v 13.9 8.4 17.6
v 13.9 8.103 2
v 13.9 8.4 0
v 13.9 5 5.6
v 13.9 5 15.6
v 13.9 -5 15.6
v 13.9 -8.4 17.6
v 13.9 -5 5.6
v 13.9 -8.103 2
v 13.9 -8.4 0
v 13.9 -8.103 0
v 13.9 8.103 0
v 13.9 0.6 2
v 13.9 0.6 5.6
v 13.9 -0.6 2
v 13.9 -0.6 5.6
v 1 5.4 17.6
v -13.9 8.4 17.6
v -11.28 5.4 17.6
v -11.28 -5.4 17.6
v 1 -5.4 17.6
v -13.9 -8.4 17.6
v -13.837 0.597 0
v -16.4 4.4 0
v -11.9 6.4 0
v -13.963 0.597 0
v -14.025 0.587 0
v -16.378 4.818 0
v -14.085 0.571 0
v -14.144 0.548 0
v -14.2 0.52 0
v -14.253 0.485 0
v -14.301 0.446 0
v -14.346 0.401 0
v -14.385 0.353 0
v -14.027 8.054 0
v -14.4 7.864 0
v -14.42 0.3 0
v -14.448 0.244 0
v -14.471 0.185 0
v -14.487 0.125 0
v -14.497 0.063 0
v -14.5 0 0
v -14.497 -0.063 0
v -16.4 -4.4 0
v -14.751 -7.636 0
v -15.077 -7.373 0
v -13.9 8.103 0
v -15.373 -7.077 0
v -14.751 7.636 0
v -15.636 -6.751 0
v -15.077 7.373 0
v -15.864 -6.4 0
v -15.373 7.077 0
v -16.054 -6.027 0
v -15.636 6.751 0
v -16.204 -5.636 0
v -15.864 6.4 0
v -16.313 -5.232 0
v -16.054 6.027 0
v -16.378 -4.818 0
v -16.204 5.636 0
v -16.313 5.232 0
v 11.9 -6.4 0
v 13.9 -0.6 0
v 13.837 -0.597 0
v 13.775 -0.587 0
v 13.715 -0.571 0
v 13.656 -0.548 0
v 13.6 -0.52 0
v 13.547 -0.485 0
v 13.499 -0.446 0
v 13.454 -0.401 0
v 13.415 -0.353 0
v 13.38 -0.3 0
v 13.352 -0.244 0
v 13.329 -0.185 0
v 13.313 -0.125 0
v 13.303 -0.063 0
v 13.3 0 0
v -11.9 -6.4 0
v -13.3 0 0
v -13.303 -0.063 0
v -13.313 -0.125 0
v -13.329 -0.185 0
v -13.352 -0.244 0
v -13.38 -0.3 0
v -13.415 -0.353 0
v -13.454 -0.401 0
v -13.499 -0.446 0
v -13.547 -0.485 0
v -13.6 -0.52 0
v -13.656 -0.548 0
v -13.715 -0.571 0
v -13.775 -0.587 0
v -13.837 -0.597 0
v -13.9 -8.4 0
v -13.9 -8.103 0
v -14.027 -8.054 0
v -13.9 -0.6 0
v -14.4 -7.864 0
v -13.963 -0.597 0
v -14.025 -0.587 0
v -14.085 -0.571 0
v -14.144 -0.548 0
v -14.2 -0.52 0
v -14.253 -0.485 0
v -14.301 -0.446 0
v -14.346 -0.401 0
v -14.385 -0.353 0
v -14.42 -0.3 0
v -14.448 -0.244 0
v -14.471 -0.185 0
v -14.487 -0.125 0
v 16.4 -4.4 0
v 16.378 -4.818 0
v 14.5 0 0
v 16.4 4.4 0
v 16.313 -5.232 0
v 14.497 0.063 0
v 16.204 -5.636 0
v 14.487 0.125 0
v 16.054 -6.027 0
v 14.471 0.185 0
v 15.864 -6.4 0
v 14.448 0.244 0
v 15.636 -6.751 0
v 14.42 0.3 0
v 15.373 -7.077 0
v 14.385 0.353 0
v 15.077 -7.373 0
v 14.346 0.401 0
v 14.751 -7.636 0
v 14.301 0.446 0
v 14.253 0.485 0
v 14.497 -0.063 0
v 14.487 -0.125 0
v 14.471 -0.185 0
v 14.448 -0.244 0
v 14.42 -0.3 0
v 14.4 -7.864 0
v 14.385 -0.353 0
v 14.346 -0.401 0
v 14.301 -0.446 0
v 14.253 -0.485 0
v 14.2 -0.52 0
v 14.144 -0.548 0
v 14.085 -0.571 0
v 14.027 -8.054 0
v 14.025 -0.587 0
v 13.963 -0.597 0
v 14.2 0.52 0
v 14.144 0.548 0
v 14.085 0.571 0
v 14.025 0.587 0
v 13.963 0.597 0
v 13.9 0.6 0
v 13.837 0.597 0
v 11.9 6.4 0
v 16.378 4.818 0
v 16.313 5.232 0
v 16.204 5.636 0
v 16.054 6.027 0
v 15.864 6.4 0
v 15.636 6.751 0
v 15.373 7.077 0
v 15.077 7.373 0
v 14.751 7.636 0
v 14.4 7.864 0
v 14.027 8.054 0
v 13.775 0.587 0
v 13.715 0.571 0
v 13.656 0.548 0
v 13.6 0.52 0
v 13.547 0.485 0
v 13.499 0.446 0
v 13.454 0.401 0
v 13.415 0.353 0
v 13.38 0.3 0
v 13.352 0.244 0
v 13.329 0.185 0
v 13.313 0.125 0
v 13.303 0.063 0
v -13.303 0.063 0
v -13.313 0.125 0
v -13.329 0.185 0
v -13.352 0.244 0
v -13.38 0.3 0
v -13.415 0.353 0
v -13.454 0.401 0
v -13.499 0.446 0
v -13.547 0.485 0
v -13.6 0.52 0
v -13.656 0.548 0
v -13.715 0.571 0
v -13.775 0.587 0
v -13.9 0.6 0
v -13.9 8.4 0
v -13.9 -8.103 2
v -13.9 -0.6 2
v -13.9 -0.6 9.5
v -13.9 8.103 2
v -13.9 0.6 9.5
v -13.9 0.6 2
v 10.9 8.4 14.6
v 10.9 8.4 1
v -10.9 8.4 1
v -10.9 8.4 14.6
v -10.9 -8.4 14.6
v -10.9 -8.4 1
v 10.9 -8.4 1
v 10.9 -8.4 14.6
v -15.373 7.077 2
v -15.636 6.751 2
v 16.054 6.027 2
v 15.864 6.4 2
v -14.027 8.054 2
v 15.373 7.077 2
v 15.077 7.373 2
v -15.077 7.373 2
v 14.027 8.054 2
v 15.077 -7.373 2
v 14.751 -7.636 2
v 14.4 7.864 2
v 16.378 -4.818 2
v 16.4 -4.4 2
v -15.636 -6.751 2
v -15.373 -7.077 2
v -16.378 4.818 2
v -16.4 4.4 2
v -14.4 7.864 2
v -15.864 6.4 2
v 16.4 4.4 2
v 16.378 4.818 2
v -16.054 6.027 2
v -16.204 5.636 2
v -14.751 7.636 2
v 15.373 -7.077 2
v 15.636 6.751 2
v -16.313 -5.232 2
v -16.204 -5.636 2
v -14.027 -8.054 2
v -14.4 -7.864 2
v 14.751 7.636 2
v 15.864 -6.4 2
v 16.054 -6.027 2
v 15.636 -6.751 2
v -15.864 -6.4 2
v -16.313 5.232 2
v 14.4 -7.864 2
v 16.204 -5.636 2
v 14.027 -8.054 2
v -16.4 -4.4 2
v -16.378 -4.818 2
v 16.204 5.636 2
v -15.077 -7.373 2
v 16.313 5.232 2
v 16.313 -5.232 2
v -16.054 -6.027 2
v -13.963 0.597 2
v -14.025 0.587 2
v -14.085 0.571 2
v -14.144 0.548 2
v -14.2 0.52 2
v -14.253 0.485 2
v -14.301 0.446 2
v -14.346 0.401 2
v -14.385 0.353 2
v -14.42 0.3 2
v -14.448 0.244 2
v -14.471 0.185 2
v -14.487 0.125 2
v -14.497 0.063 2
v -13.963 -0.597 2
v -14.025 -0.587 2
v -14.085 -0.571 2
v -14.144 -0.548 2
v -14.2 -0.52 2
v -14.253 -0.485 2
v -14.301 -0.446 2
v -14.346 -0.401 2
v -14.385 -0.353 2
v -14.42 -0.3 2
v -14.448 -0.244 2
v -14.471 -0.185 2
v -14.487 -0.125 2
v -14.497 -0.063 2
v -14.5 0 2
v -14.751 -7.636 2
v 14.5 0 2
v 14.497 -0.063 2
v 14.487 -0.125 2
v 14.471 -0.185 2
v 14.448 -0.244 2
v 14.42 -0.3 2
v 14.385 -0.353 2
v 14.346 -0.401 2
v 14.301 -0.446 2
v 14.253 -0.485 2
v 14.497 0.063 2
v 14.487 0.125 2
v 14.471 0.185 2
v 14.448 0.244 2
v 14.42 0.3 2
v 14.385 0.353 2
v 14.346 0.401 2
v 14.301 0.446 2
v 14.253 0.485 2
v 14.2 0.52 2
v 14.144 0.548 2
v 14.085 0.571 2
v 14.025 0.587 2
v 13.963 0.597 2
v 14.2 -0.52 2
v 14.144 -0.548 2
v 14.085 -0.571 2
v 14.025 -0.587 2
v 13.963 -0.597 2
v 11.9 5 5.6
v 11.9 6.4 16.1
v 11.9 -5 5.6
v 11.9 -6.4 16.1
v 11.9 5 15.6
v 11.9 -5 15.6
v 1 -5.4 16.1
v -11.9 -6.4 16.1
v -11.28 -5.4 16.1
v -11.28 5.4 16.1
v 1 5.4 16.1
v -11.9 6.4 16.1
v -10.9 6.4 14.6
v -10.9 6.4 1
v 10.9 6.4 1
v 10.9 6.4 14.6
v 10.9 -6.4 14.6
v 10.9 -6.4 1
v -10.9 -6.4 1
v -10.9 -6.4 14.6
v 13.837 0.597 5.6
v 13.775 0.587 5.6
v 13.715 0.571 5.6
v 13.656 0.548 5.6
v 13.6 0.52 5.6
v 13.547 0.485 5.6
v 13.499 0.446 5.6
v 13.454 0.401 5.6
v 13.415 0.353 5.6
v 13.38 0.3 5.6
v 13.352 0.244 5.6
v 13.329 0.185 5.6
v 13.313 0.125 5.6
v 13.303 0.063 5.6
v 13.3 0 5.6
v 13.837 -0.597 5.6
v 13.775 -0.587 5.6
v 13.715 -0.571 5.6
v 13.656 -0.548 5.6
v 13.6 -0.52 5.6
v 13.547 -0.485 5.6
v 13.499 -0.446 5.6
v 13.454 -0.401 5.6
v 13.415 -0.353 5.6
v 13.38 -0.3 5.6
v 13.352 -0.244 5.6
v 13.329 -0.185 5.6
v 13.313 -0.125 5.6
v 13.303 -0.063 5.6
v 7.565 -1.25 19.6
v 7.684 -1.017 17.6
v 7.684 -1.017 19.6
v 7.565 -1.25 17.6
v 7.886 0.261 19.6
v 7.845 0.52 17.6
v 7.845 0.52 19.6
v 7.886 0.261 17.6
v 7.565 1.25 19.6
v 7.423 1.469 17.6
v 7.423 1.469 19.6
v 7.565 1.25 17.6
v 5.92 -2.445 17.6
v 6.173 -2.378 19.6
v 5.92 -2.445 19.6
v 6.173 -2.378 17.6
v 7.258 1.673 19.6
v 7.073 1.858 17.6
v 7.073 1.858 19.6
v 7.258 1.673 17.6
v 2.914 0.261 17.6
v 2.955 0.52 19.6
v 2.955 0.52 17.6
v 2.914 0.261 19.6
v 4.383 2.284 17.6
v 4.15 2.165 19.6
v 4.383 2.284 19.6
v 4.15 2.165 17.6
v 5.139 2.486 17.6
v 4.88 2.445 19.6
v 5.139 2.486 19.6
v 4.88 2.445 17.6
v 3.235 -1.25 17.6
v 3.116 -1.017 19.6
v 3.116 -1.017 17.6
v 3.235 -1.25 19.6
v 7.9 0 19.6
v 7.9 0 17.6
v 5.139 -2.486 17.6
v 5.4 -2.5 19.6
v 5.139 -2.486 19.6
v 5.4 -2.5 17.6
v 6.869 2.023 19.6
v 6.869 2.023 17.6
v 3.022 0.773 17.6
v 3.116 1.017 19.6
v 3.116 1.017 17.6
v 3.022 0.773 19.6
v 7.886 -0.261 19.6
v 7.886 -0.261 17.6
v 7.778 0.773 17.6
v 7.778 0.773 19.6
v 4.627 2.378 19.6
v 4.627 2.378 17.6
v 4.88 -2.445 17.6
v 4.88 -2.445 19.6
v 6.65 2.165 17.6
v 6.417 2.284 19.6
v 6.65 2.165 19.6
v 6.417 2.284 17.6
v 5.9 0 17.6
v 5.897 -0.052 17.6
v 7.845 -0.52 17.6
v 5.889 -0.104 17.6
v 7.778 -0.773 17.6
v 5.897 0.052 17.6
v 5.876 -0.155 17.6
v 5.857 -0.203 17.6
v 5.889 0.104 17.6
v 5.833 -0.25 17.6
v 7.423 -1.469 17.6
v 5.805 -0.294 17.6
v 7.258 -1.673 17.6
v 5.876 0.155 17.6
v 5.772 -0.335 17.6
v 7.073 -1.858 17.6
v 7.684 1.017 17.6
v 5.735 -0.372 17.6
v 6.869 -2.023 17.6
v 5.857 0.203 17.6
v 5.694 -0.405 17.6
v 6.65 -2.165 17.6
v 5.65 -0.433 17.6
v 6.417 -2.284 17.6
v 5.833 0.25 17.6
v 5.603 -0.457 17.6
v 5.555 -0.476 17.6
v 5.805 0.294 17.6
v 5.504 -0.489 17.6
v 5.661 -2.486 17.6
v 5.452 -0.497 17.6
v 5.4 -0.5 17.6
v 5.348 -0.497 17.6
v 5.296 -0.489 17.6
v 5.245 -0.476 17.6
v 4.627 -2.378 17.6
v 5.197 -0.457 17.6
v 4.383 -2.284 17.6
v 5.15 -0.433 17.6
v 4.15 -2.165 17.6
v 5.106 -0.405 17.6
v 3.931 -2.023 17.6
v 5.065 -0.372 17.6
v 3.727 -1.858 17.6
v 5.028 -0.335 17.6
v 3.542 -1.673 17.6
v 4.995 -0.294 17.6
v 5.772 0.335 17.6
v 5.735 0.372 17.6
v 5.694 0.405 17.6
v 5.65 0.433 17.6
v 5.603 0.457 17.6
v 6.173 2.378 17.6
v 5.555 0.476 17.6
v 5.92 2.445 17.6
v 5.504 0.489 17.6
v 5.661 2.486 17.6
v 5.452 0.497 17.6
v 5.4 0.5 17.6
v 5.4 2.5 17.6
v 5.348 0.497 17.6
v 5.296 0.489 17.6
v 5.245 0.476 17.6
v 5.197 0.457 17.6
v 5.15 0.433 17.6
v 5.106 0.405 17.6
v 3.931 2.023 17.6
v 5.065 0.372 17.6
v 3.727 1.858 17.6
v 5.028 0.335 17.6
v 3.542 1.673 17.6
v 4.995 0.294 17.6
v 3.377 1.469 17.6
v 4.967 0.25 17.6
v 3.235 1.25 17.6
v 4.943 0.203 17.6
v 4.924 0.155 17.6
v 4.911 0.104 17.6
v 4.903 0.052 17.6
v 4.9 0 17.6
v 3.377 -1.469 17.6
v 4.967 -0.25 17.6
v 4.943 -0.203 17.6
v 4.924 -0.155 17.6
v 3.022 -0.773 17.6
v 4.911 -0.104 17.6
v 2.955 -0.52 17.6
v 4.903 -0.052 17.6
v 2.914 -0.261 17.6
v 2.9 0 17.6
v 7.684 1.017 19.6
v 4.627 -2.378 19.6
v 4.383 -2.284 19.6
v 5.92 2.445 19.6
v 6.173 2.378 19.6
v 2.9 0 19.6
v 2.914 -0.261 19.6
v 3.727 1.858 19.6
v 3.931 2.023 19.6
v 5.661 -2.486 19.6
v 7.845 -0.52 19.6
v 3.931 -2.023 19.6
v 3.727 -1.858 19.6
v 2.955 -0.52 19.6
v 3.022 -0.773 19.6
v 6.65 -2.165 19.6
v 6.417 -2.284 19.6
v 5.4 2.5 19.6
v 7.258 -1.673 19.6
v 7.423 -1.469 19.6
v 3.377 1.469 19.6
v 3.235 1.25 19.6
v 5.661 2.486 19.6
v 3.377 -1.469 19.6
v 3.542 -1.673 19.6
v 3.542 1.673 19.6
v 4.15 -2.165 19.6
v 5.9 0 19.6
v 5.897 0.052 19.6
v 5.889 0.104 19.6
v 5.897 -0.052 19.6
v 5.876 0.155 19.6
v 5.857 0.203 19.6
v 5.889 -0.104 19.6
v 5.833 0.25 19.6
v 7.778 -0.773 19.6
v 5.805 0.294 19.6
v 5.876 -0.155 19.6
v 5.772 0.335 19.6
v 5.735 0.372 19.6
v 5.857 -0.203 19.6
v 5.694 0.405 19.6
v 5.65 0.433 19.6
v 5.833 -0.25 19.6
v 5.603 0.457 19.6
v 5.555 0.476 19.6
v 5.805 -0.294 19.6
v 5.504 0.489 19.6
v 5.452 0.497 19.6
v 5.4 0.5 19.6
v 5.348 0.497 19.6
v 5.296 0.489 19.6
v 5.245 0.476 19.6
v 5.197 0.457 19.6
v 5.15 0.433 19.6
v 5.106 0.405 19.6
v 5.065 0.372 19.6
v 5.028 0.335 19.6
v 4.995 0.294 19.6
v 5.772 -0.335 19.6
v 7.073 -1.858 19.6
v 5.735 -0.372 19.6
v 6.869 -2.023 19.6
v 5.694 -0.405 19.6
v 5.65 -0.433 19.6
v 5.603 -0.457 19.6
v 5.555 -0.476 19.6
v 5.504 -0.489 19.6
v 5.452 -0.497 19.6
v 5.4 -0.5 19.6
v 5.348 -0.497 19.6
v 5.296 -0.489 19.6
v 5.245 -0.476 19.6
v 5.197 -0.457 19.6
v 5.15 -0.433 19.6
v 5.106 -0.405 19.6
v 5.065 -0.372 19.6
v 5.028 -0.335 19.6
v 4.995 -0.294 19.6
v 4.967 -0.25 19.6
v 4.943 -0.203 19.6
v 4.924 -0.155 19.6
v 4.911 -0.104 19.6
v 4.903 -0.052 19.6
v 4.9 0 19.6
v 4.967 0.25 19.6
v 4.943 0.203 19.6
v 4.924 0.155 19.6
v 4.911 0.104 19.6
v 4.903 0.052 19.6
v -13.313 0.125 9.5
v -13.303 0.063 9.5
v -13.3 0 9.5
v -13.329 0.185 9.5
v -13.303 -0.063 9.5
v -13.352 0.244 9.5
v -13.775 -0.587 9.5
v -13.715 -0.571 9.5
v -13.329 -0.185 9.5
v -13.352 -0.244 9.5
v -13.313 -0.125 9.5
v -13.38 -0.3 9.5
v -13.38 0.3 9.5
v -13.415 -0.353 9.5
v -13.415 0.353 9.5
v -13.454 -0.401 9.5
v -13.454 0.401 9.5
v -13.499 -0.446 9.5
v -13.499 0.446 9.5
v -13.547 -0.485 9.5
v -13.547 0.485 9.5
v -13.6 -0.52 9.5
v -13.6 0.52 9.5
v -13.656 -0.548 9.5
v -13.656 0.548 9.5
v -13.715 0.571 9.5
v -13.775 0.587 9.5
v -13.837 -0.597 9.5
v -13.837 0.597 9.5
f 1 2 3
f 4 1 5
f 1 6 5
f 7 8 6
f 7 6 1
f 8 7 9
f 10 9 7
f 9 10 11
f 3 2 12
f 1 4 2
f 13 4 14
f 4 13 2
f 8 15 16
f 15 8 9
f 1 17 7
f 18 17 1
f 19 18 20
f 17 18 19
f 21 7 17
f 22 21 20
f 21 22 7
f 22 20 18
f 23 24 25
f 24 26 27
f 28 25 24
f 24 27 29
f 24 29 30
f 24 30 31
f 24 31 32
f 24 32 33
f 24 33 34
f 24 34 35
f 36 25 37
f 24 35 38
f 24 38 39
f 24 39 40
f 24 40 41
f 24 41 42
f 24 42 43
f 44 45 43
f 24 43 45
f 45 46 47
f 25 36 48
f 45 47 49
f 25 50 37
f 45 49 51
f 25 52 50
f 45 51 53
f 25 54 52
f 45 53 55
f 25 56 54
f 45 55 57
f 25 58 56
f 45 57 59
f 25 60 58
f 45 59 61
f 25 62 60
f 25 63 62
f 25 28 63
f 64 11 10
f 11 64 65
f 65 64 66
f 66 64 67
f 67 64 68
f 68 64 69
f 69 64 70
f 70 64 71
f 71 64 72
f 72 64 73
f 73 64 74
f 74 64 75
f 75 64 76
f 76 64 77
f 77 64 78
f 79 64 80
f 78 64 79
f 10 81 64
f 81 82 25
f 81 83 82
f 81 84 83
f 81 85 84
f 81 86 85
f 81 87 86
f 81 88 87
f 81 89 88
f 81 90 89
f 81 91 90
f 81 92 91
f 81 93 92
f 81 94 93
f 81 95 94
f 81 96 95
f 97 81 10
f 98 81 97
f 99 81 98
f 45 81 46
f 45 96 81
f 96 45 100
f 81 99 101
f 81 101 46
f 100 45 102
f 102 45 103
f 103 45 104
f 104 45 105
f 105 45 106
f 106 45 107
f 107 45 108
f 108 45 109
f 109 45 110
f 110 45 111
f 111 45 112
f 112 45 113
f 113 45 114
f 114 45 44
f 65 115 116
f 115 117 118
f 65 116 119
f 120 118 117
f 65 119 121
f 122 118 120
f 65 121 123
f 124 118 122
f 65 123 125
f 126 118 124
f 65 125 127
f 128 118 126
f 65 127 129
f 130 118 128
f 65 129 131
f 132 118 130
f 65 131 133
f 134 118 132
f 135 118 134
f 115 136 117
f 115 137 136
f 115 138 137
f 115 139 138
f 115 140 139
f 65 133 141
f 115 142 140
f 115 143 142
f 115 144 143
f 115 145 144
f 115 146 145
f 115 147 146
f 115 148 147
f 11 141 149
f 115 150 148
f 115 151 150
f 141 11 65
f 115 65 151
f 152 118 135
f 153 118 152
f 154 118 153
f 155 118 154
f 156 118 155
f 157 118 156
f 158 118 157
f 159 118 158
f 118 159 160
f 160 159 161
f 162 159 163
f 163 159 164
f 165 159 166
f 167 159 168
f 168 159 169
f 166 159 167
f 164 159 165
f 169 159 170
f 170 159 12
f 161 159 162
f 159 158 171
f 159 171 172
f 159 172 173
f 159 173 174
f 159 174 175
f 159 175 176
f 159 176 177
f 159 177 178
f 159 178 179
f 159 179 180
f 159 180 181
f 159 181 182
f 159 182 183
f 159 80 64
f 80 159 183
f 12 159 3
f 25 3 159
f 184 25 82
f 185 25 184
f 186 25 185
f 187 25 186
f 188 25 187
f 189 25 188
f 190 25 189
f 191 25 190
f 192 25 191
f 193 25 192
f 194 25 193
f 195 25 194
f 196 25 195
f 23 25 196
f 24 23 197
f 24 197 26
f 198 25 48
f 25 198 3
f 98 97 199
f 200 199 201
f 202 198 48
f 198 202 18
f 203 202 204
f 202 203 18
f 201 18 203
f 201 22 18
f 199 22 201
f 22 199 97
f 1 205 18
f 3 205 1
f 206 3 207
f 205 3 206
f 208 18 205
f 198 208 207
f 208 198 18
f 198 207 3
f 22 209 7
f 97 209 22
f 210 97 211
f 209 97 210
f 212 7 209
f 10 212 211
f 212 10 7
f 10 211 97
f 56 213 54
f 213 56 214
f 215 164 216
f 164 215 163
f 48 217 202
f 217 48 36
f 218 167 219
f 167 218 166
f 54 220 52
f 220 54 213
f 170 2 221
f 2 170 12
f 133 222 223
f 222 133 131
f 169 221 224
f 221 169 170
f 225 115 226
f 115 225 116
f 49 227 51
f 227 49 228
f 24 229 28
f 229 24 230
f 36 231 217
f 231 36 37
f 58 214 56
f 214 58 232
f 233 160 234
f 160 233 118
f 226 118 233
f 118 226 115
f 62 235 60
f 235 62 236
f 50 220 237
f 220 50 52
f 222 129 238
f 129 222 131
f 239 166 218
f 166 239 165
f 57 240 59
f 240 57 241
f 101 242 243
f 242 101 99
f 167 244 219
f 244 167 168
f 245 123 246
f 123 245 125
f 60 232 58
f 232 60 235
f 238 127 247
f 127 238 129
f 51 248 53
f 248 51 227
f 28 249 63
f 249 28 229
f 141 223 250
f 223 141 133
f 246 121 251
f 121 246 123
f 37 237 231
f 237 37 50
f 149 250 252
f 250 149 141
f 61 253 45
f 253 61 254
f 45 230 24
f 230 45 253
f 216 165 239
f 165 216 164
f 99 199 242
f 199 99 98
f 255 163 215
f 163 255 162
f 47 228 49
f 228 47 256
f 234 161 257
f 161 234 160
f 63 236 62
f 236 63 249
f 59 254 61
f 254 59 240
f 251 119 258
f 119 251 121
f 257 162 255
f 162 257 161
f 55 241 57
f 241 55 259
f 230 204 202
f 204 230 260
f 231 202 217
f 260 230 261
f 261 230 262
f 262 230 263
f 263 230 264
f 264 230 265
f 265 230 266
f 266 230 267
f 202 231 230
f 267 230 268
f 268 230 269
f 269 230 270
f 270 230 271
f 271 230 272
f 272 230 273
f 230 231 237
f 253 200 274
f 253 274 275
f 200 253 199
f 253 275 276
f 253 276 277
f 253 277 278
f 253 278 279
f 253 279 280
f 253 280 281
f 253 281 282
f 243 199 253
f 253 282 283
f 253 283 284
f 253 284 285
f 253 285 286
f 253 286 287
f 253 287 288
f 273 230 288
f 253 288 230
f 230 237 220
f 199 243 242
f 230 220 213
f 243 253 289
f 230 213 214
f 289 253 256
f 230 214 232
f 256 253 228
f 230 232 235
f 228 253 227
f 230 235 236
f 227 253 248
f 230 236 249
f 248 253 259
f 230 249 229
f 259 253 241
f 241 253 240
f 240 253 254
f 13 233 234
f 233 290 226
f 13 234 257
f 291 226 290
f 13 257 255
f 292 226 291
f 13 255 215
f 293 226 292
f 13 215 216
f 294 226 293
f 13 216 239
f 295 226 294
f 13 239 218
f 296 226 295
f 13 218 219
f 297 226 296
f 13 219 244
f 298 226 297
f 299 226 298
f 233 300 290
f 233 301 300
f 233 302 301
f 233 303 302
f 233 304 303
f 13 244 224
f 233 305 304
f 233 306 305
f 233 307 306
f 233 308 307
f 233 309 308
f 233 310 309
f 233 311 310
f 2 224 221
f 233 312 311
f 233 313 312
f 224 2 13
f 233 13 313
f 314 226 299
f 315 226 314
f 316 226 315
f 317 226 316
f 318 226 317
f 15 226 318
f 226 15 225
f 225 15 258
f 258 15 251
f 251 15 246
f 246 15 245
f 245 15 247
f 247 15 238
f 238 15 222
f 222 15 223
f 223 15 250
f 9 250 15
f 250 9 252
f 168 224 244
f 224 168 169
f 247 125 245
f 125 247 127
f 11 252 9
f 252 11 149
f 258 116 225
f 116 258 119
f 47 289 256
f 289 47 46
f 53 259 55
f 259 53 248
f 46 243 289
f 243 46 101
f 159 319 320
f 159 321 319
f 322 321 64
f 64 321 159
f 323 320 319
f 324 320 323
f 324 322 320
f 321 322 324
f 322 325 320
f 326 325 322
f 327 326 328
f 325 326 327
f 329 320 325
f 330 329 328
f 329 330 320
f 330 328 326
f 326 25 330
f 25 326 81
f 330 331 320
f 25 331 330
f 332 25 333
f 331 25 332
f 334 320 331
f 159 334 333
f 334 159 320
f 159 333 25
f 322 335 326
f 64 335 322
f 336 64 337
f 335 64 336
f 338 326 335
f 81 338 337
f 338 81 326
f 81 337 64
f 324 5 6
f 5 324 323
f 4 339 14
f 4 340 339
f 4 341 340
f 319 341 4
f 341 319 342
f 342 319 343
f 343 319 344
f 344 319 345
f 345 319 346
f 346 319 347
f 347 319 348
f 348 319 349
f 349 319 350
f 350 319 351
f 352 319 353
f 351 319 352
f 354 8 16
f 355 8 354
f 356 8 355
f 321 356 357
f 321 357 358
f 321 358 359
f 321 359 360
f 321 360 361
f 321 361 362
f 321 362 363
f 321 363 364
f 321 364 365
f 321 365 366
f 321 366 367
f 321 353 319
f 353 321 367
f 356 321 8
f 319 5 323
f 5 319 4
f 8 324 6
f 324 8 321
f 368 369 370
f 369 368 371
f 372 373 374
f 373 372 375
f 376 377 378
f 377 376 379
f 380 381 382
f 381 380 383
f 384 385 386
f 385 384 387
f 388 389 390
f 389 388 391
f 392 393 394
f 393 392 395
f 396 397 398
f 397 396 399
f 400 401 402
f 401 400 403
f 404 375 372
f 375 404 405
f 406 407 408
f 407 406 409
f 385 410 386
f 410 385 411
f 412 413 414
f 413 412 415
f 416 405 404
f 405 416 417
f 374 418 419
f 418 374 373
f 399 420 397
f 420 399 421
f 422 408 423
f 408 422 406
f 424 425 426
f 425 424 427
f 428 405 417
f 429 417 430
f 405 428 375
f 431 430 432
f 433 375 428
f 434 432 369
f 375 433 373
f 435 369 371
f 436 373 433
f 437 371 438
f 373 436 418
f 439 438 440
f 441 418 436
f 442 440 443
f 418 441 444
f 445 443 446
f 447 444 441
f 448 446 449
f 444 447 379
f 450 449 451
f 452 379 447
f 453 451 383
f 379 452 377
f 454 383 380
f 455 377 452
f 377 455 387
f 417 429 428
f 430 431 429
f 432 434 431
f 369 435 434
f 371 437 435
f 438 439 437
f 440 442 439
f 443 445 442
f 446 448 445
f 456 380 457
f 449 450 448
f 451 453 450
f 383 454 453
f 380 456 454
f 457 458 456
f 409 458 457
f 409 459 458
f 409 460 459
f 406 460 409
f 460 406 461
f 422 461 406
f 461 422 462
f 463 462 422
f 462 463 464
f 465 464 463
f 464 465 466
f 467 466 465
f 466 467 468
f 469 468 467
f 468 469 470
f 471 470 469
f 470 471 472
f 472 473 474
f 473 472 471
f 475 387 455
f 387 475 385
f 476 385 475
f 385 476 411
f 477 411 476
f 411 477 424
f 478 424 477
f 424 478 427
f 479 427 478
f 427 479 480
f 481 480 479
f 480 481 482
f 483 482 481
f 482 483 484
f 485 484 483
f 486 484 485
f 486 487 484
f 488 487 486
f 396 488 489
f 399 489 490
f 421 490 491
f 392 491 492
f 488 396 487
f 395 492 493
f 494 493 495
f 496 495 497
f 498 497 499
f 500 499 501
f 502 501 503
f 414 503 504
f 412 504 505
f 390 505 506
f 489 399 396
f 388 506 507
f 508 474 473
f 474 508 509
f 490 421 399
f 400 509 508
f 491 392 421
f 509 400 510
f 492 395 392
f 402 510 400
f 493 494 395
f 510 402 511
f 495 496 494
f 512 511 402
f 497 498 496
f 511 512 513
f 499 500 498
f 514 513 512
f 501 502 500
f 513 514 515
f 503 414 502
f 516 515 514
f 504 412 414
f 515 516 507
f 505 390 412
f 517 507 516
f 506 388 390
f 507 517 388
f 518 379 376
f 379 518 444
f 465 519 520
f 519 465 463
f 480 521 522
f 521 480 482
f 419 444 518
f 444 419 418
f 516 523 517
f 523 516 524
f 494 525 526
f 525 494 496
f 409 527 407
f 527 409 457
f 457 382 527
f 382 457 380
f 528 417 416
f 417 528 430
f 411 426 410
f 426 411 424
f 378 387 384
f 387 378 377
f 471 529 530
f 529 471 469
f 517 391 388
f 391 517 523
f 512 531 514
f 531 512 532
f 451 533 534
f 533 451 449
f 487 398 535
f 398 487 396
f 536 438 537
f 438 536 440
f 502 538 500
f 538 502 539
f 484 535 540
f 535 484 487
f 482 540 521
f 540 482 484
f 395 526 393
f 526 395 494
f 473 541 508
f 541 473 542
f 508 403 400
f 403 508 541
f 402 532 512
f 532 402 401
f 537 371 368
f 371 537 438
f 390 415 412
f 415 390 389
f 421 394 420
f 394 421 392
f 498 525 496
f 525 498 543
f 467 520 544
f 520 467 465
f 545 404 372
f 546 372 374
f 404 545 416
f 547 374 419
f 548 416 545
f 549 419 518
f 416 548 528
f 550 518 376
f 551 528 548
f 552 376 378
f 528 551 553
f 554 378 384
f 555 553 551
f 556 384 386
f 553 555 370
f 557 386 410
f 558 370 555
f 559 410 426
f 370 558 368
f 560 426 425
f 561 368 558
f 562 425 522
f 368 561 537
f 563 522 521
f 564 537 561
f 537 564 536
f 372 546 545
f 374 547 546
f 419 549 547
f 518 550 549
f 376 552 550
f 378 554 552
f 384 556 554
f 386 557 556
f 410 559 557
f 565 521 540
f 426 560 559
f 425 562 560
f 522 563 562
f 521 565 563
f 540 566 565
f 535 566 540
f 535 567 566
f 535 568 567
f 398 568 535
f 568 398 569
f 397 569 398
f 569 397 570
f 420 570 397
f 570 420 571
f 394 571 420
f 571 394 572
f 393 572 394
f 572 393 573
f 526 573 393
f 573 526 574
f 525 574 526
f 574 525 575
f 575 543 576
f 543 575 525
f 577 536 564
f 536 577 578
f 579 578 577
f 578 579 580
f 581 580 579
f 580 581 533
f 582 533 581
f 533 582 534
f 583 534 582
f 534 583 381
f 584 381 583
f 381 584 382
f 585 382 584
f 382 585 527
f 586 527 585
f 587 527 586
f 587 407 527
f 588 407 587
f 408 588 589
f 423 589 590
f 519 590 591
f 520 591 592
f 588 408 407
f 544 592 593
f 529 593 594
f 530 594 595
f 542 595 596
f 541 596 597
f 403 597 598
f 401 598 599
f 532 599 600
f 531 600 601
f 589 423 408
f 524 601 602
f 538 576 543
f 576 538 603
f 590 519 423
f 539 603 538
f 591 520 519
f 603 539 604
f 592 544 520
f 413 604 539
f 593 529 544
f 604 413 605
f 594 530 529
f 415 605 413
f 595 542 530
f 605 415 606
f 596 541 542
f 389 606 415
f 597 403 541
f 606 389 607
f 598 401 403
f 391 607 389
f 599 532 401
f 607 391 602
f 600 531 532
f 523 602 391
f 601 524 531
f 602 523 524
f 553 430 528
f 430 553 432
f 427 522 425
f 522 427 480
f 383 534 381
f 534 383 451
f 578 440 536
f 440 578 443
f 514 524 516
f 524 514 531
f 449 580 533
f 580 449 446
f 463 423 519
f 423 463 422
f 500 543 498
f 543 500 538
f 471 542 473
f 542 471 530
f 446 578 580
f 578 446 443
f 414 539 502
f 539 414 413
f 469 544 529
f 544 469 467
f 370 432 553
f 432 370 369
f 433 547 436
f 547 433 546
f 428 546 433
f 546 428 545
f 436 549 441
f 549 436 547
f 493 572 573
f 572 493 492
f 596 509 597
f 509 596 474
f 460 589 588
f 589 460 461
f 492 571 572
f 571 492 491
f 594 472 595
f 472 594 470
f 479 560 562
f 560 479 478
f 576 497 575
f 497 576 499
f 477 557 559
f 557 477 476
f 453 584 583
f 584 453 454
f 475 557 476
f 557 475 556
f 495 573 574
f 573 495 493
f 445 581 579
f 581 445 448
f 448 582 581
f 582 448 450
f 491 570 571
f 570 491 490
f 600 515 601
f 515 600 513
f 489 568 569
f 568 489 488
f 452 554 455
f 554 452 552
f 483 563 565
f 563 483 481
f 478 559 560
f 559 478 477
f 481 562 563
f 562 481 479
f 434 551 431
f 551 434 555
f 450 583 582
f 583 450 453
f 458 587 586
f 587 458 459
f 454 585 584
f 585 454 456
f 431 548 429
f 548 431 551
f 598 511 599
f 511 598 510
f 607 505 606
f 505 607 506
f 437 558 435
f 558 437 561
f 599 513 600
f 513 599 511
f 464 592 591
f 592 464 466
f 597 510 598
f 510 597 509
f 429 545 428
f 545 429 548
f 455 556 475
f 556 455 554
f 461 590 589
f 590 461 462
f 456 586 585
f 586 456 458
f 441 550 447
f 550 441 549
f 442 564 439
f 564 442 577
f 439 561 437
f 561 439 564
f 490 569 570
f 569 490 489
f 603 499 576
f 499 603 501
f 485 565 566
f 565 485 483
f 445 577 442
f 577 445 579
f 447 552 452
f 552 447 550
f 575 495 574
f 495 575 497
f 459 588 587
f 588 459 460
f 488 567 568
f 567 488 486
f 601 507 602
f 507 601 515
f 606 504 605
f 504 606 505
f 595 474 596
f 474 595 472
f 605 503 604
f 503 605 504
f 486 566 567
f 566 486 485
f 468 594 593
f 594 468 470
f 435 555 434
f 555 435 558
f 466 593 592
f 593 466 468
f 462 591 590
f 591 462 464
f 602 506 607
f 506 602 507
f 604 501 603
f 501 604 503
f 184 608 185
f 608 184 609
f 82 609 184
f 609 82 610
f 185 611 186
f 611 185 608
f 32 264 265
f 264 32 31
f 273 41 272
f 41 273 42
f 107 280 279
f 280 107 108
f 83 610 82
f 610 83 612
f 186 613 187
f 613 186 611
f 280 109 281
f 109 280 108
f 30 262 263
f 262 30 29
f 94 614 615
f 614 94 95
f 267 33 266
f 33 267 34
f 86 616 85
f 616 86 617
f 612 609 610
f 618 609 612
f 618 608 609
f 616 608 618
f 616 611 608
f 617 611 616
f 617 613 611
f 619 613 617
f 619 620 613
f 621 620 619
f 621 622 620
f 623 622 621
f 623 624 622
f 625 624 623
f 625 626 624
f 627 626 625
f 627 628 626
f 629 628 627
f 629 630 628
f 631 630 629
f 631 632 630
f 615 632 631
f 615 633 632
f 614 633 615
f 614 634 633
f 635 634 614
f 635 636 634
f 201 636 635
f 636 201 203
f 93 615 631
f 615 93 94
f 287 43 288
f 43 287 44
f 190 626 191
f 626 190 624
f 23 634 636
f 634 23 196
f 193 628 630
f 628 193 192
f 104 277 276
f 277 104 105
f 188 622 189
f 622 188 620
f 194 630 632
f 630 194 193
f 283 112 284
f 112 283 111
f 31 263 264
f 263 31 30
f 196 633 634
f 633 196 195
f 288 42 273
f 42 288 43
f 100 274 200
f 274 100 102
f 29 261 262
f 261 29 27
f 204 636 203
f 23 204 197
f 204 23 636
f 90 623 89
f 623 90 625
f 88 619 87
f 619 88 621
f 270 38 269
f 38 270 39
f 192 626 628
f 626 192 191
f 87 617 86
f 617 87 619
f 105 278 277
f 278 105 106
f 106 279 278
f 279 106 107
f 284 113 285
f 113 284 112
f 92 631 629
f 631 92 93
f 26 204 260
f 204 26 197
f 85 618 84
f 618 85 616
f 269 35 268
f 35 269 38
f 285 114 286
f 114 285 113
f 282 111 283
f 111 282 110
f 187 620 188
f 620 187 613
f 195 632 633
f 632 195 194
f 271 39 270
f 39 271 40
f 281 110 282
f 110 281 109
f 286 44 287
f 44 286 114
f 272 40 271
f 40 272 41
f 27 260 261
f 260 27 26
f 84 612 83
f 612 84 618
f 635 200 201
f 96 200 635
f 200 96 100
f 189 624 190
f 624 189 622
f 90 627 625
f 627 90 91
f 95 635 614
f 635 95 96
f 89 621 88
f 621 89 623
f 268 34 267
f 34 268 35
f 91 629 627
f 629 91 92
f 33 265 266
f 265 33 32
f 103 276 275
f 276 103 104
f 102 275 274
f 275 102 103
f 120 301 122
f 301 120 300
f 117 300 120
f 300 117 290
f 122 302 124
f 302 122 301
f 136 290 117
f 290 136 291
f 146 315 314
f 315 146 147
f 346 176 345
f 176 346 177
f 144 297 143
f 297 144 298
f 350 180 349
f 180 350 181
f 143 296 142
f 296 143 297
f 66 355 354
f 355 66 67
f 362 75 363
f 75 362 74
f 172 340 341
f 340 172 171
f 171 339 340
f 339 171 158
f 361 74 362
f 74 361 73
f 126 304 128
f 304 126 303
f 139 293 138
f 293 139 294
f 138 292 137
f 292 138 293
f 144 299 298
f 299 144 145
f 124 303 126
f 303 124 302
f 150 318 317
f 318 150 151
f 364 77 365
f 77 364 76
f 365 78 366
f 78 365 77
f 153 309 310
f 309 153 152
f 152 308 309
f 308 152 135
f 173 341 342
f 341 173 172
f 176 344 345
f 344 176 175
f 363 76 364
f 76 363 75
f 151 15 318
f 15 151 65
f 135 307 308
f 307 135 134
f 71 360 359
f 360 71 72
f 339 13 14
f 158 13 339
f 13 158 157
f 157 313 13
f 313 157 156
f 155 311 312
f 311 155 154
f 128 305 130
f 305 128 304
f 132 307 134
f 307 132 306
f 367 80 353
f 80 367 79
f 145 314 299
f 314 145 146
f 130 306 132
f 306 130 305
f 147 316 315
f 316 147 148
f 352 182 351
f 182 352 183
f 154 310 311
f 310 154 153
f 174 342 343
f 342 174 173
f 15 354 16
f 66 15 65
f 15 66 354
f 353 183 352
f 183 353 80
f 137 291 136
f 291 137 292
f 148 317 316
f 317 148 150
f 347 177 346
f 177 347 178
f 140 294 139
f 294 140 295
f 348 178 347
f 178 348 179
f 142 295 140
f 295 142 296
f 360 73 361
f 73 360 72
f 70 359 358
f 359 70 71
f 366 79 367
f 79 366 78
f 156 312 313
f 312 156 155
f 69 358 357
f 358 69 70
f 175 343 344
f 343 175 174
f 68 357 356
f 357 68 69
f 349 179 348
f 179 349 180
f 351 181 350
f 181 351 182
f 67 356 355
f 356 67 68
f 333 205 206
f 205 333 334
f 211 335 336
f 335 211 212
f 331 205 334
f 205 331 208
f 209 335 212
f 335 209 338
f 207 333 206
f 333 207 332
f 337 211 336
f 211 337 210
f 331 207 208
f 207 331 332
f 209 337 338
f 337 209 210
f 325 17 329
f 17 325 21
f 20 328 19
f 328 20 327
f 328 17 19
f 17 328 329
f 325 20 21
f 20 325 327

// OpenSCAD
//Actual servo dimensions
//length: 23.5
//width: = 12.5
//height = 16

faces = 60;
caddy_thickness=2;
caddy_edges_widths=2; //Size of side left after subtracting to reduce print material/time
servo_height=15.6;
servo_width=12.8;
servo_length=23.8;
screw_lips=4;
caddy_length=servo_length+2*caddy_edges_widths;

screw_height=9;
screw_radius=0.6;
screw_offset_from_edge=2;

hinge_position=6.5;
hinge_radius=2.5;
hinge_height=2;
hinge_hole_radius=0.5;

leg_length=30;
leg_width=2;
leg_end_radius=2;

hinge_thickness=2;
hinge_length=20;
hinge_servo_height = servo_height + 8;
hinge_radius_hole=hinge_radius+0.2;
hinge_radius_servo_hole=3.5;
hinge_radius_servo_screw_hole=8;
hinge_radius_servo_screw_hole_radius=0.5;
hinge_arm_length=5;



//hinge_joint_perpendicular();
//hinge_joint_straight();
//hinge_leg();
complete_caddy();

module hinge_joint_straight()
{
	//Arm part
	translate([hinge_length +hinge_arm_length/2 ,0,hinge_servo_height/2]) cube([hinge_arm_length, servo_width, hinge_thickness], center=true);

	translate([hinge_length +hinge_arm_length/2 ,0,hinge_servo_height/2-servo_height/2+hinge_height]) cube([hinge_arm_length, servo_width, hinge_thickness], center=true);

	translate([0 ,0,-servo_height/2+hinge_height]) hinge();

	translate([hinge_length+caddy_thickness/2 + servo_length/2+hinge_arm_length, 0,0]) rotate([0,0,0]) complete_caddy();
}

module hinge_joint_perpendicular()
{
	hinge();

	translate([hinge_length+caddy_thickness/2 + servo_length/2, (servo_width)/2,caddy_length/2-caddy_thickness/2]) rotate([90,0,0]) complete_caddy();
}

module hinge_leg()
{
	complete_caddy();
	leg();
}


module hinge()
{
	//Arm part
	//translate([hinge_length +hinge_arm_length/2 ,0,hinge_servo_height/2]) cube([hinge_arm_length, servo_width, hinge_thickness], center=true);

	translate([0,0,hinge_thickness/2])
	union()
	{

		//Hinge part - Servo pivot side
		difference()
		{
			union()
			{
				cylinder(r=servo_width/2, h=hinge_thickness, $fn=faces, center=true);
				translate([hinge_length/2,0,0]) cube([hinge_length, servo_width, hinge_thickness], center=true);
			}
			cylinder(r=hinge_radius_servo_hole, h=hinge_thickness+1, $fn=faces, center=true);
			translate([hinge_radius_servo_screw_hole,0,0]) cylinder(r=hinge_radius_servo_screw_hole_radius, h=hinge_thickness+1, $fn=faces, center=true);
		}	


		//Hinge part - Artifical pivot side
		translate([0,0,hinge_servo_height])
		difference()
		{
			union()
			{
				cylinder(r=servo_width/2, h=hinge_thickness, $fn=faces, center=true);
				translate([hinge_length/2,0,0]) cube([hinge_length, servo_width, hinge_thickness], center=true);
			}
			cylinder(r=hinge_radius_hole, h=hinge_thickness+1, $fn=faces, center=true);
		
		}	

		translate([hinge_length,0,hinge_servo_height/2]) cube([hinge_thickness, servo_width, hinge_servo_height+hinge_thickness ], center=true);

	}//union


}


module complete_caddy()
{
	difference()
	{
		union()
		{
			caddy();
			hinge_point();
//			leg();
		}

		//Subtract screw holes
		translate([-servo_length/2-screw_offset_from_edge,0,screw_height/2]) cylinder(r=screw_radius, h=screw_height+1, center=true, $fn=faces);
		translate([servo_length/2+screw_offset_from_edge,0,screw_height/2]) cylinder(r=screw_radius, h=screw_height+1, center=true, $fn=faces);

		//Subtract Z bottom area to reduce print material and time
		translate([0,0,servo_height/2]) cube([servo_length-caddy_edges_widths,2*servo_width,servo_height-caddy_edges_widths], center=true, $fn=faces);

		
		//Subtract Y side areas to reduce print material and time
        translate([-servo_length*.6/2+caddy_edges_widths,0,servo_height/2]) cube([servo_length*.6-caddy_edges_widths,servo_width-caddy_edges_widths,2*servo_height], center=true, $fn=faces);

	}
}


module caddy(){
	difference()
	{
		union()
		{
			translate([0,0,servo_height/2+caddy_thickness/2]) cube([servo_length+caddy_thickness*2, servo_width+caddy_thickness*2, servo_height+caddy_thickness], center=true, $fn=faces);

			translate([0,0,caddy_thickness/2]) 
			minkowski()
			{
				cube([servo_length+caddy_thickness/2, servo_width+caddy_thickness*2-screw_lips*2, caddy_thickness/2], center=true, $fn=faces);
				cylinder(r=screw_lips, h=caddy_thickness/2, center=true, $fn=faces);
			}
		}

        //Half of top hole
		translate([0,0,servo_height/2]) cube([servo_length, servo_width, servo_height+1], center=true, $fn=faces);

	//Servo wire hole	//translate([servo_length/2+caddy_thickness,0,servo_height+caddy_thickness-3]) sphere(r=servo_width/3, $fn=faces, center=true);
		translate([servo_length/2+caddy_thickness,0,servo_height-caddy_thickness-3]) cube([20,10,10], $fn=faces, center=true);
	}

}

module hinge_point()
{
	translate([servo_length/2-hinge_position,0,hinge_height/2+servo_height+caddy_thickness]) 
	difference(){
		cylinder(r=hinge_radius, h=hinge_height, $fn=faces, center=true);
		cylinder(r=hinge_hole_radius, h=hinge_height+1, $fn=faces, center=true);
	}
}


module leg()
{
	translate([-screw_lips/2-servo_length/2,0,servo_height/2+caddy_thickness/2]) 
	hull()
	{	
		cube([screw_lips,leg_width,servo_height+caddy_thickness], center=true);
		rotate([0,0,0]) translate([-leg_length-servo_length/2+leg_end_radius,0,-servo_height/2-caddy_thickness/2+leg_width/2+leg_end_radius-1]) sphere(r=leg_end_radius, h=leg_width, center=true, $fn=faces);
}


}
